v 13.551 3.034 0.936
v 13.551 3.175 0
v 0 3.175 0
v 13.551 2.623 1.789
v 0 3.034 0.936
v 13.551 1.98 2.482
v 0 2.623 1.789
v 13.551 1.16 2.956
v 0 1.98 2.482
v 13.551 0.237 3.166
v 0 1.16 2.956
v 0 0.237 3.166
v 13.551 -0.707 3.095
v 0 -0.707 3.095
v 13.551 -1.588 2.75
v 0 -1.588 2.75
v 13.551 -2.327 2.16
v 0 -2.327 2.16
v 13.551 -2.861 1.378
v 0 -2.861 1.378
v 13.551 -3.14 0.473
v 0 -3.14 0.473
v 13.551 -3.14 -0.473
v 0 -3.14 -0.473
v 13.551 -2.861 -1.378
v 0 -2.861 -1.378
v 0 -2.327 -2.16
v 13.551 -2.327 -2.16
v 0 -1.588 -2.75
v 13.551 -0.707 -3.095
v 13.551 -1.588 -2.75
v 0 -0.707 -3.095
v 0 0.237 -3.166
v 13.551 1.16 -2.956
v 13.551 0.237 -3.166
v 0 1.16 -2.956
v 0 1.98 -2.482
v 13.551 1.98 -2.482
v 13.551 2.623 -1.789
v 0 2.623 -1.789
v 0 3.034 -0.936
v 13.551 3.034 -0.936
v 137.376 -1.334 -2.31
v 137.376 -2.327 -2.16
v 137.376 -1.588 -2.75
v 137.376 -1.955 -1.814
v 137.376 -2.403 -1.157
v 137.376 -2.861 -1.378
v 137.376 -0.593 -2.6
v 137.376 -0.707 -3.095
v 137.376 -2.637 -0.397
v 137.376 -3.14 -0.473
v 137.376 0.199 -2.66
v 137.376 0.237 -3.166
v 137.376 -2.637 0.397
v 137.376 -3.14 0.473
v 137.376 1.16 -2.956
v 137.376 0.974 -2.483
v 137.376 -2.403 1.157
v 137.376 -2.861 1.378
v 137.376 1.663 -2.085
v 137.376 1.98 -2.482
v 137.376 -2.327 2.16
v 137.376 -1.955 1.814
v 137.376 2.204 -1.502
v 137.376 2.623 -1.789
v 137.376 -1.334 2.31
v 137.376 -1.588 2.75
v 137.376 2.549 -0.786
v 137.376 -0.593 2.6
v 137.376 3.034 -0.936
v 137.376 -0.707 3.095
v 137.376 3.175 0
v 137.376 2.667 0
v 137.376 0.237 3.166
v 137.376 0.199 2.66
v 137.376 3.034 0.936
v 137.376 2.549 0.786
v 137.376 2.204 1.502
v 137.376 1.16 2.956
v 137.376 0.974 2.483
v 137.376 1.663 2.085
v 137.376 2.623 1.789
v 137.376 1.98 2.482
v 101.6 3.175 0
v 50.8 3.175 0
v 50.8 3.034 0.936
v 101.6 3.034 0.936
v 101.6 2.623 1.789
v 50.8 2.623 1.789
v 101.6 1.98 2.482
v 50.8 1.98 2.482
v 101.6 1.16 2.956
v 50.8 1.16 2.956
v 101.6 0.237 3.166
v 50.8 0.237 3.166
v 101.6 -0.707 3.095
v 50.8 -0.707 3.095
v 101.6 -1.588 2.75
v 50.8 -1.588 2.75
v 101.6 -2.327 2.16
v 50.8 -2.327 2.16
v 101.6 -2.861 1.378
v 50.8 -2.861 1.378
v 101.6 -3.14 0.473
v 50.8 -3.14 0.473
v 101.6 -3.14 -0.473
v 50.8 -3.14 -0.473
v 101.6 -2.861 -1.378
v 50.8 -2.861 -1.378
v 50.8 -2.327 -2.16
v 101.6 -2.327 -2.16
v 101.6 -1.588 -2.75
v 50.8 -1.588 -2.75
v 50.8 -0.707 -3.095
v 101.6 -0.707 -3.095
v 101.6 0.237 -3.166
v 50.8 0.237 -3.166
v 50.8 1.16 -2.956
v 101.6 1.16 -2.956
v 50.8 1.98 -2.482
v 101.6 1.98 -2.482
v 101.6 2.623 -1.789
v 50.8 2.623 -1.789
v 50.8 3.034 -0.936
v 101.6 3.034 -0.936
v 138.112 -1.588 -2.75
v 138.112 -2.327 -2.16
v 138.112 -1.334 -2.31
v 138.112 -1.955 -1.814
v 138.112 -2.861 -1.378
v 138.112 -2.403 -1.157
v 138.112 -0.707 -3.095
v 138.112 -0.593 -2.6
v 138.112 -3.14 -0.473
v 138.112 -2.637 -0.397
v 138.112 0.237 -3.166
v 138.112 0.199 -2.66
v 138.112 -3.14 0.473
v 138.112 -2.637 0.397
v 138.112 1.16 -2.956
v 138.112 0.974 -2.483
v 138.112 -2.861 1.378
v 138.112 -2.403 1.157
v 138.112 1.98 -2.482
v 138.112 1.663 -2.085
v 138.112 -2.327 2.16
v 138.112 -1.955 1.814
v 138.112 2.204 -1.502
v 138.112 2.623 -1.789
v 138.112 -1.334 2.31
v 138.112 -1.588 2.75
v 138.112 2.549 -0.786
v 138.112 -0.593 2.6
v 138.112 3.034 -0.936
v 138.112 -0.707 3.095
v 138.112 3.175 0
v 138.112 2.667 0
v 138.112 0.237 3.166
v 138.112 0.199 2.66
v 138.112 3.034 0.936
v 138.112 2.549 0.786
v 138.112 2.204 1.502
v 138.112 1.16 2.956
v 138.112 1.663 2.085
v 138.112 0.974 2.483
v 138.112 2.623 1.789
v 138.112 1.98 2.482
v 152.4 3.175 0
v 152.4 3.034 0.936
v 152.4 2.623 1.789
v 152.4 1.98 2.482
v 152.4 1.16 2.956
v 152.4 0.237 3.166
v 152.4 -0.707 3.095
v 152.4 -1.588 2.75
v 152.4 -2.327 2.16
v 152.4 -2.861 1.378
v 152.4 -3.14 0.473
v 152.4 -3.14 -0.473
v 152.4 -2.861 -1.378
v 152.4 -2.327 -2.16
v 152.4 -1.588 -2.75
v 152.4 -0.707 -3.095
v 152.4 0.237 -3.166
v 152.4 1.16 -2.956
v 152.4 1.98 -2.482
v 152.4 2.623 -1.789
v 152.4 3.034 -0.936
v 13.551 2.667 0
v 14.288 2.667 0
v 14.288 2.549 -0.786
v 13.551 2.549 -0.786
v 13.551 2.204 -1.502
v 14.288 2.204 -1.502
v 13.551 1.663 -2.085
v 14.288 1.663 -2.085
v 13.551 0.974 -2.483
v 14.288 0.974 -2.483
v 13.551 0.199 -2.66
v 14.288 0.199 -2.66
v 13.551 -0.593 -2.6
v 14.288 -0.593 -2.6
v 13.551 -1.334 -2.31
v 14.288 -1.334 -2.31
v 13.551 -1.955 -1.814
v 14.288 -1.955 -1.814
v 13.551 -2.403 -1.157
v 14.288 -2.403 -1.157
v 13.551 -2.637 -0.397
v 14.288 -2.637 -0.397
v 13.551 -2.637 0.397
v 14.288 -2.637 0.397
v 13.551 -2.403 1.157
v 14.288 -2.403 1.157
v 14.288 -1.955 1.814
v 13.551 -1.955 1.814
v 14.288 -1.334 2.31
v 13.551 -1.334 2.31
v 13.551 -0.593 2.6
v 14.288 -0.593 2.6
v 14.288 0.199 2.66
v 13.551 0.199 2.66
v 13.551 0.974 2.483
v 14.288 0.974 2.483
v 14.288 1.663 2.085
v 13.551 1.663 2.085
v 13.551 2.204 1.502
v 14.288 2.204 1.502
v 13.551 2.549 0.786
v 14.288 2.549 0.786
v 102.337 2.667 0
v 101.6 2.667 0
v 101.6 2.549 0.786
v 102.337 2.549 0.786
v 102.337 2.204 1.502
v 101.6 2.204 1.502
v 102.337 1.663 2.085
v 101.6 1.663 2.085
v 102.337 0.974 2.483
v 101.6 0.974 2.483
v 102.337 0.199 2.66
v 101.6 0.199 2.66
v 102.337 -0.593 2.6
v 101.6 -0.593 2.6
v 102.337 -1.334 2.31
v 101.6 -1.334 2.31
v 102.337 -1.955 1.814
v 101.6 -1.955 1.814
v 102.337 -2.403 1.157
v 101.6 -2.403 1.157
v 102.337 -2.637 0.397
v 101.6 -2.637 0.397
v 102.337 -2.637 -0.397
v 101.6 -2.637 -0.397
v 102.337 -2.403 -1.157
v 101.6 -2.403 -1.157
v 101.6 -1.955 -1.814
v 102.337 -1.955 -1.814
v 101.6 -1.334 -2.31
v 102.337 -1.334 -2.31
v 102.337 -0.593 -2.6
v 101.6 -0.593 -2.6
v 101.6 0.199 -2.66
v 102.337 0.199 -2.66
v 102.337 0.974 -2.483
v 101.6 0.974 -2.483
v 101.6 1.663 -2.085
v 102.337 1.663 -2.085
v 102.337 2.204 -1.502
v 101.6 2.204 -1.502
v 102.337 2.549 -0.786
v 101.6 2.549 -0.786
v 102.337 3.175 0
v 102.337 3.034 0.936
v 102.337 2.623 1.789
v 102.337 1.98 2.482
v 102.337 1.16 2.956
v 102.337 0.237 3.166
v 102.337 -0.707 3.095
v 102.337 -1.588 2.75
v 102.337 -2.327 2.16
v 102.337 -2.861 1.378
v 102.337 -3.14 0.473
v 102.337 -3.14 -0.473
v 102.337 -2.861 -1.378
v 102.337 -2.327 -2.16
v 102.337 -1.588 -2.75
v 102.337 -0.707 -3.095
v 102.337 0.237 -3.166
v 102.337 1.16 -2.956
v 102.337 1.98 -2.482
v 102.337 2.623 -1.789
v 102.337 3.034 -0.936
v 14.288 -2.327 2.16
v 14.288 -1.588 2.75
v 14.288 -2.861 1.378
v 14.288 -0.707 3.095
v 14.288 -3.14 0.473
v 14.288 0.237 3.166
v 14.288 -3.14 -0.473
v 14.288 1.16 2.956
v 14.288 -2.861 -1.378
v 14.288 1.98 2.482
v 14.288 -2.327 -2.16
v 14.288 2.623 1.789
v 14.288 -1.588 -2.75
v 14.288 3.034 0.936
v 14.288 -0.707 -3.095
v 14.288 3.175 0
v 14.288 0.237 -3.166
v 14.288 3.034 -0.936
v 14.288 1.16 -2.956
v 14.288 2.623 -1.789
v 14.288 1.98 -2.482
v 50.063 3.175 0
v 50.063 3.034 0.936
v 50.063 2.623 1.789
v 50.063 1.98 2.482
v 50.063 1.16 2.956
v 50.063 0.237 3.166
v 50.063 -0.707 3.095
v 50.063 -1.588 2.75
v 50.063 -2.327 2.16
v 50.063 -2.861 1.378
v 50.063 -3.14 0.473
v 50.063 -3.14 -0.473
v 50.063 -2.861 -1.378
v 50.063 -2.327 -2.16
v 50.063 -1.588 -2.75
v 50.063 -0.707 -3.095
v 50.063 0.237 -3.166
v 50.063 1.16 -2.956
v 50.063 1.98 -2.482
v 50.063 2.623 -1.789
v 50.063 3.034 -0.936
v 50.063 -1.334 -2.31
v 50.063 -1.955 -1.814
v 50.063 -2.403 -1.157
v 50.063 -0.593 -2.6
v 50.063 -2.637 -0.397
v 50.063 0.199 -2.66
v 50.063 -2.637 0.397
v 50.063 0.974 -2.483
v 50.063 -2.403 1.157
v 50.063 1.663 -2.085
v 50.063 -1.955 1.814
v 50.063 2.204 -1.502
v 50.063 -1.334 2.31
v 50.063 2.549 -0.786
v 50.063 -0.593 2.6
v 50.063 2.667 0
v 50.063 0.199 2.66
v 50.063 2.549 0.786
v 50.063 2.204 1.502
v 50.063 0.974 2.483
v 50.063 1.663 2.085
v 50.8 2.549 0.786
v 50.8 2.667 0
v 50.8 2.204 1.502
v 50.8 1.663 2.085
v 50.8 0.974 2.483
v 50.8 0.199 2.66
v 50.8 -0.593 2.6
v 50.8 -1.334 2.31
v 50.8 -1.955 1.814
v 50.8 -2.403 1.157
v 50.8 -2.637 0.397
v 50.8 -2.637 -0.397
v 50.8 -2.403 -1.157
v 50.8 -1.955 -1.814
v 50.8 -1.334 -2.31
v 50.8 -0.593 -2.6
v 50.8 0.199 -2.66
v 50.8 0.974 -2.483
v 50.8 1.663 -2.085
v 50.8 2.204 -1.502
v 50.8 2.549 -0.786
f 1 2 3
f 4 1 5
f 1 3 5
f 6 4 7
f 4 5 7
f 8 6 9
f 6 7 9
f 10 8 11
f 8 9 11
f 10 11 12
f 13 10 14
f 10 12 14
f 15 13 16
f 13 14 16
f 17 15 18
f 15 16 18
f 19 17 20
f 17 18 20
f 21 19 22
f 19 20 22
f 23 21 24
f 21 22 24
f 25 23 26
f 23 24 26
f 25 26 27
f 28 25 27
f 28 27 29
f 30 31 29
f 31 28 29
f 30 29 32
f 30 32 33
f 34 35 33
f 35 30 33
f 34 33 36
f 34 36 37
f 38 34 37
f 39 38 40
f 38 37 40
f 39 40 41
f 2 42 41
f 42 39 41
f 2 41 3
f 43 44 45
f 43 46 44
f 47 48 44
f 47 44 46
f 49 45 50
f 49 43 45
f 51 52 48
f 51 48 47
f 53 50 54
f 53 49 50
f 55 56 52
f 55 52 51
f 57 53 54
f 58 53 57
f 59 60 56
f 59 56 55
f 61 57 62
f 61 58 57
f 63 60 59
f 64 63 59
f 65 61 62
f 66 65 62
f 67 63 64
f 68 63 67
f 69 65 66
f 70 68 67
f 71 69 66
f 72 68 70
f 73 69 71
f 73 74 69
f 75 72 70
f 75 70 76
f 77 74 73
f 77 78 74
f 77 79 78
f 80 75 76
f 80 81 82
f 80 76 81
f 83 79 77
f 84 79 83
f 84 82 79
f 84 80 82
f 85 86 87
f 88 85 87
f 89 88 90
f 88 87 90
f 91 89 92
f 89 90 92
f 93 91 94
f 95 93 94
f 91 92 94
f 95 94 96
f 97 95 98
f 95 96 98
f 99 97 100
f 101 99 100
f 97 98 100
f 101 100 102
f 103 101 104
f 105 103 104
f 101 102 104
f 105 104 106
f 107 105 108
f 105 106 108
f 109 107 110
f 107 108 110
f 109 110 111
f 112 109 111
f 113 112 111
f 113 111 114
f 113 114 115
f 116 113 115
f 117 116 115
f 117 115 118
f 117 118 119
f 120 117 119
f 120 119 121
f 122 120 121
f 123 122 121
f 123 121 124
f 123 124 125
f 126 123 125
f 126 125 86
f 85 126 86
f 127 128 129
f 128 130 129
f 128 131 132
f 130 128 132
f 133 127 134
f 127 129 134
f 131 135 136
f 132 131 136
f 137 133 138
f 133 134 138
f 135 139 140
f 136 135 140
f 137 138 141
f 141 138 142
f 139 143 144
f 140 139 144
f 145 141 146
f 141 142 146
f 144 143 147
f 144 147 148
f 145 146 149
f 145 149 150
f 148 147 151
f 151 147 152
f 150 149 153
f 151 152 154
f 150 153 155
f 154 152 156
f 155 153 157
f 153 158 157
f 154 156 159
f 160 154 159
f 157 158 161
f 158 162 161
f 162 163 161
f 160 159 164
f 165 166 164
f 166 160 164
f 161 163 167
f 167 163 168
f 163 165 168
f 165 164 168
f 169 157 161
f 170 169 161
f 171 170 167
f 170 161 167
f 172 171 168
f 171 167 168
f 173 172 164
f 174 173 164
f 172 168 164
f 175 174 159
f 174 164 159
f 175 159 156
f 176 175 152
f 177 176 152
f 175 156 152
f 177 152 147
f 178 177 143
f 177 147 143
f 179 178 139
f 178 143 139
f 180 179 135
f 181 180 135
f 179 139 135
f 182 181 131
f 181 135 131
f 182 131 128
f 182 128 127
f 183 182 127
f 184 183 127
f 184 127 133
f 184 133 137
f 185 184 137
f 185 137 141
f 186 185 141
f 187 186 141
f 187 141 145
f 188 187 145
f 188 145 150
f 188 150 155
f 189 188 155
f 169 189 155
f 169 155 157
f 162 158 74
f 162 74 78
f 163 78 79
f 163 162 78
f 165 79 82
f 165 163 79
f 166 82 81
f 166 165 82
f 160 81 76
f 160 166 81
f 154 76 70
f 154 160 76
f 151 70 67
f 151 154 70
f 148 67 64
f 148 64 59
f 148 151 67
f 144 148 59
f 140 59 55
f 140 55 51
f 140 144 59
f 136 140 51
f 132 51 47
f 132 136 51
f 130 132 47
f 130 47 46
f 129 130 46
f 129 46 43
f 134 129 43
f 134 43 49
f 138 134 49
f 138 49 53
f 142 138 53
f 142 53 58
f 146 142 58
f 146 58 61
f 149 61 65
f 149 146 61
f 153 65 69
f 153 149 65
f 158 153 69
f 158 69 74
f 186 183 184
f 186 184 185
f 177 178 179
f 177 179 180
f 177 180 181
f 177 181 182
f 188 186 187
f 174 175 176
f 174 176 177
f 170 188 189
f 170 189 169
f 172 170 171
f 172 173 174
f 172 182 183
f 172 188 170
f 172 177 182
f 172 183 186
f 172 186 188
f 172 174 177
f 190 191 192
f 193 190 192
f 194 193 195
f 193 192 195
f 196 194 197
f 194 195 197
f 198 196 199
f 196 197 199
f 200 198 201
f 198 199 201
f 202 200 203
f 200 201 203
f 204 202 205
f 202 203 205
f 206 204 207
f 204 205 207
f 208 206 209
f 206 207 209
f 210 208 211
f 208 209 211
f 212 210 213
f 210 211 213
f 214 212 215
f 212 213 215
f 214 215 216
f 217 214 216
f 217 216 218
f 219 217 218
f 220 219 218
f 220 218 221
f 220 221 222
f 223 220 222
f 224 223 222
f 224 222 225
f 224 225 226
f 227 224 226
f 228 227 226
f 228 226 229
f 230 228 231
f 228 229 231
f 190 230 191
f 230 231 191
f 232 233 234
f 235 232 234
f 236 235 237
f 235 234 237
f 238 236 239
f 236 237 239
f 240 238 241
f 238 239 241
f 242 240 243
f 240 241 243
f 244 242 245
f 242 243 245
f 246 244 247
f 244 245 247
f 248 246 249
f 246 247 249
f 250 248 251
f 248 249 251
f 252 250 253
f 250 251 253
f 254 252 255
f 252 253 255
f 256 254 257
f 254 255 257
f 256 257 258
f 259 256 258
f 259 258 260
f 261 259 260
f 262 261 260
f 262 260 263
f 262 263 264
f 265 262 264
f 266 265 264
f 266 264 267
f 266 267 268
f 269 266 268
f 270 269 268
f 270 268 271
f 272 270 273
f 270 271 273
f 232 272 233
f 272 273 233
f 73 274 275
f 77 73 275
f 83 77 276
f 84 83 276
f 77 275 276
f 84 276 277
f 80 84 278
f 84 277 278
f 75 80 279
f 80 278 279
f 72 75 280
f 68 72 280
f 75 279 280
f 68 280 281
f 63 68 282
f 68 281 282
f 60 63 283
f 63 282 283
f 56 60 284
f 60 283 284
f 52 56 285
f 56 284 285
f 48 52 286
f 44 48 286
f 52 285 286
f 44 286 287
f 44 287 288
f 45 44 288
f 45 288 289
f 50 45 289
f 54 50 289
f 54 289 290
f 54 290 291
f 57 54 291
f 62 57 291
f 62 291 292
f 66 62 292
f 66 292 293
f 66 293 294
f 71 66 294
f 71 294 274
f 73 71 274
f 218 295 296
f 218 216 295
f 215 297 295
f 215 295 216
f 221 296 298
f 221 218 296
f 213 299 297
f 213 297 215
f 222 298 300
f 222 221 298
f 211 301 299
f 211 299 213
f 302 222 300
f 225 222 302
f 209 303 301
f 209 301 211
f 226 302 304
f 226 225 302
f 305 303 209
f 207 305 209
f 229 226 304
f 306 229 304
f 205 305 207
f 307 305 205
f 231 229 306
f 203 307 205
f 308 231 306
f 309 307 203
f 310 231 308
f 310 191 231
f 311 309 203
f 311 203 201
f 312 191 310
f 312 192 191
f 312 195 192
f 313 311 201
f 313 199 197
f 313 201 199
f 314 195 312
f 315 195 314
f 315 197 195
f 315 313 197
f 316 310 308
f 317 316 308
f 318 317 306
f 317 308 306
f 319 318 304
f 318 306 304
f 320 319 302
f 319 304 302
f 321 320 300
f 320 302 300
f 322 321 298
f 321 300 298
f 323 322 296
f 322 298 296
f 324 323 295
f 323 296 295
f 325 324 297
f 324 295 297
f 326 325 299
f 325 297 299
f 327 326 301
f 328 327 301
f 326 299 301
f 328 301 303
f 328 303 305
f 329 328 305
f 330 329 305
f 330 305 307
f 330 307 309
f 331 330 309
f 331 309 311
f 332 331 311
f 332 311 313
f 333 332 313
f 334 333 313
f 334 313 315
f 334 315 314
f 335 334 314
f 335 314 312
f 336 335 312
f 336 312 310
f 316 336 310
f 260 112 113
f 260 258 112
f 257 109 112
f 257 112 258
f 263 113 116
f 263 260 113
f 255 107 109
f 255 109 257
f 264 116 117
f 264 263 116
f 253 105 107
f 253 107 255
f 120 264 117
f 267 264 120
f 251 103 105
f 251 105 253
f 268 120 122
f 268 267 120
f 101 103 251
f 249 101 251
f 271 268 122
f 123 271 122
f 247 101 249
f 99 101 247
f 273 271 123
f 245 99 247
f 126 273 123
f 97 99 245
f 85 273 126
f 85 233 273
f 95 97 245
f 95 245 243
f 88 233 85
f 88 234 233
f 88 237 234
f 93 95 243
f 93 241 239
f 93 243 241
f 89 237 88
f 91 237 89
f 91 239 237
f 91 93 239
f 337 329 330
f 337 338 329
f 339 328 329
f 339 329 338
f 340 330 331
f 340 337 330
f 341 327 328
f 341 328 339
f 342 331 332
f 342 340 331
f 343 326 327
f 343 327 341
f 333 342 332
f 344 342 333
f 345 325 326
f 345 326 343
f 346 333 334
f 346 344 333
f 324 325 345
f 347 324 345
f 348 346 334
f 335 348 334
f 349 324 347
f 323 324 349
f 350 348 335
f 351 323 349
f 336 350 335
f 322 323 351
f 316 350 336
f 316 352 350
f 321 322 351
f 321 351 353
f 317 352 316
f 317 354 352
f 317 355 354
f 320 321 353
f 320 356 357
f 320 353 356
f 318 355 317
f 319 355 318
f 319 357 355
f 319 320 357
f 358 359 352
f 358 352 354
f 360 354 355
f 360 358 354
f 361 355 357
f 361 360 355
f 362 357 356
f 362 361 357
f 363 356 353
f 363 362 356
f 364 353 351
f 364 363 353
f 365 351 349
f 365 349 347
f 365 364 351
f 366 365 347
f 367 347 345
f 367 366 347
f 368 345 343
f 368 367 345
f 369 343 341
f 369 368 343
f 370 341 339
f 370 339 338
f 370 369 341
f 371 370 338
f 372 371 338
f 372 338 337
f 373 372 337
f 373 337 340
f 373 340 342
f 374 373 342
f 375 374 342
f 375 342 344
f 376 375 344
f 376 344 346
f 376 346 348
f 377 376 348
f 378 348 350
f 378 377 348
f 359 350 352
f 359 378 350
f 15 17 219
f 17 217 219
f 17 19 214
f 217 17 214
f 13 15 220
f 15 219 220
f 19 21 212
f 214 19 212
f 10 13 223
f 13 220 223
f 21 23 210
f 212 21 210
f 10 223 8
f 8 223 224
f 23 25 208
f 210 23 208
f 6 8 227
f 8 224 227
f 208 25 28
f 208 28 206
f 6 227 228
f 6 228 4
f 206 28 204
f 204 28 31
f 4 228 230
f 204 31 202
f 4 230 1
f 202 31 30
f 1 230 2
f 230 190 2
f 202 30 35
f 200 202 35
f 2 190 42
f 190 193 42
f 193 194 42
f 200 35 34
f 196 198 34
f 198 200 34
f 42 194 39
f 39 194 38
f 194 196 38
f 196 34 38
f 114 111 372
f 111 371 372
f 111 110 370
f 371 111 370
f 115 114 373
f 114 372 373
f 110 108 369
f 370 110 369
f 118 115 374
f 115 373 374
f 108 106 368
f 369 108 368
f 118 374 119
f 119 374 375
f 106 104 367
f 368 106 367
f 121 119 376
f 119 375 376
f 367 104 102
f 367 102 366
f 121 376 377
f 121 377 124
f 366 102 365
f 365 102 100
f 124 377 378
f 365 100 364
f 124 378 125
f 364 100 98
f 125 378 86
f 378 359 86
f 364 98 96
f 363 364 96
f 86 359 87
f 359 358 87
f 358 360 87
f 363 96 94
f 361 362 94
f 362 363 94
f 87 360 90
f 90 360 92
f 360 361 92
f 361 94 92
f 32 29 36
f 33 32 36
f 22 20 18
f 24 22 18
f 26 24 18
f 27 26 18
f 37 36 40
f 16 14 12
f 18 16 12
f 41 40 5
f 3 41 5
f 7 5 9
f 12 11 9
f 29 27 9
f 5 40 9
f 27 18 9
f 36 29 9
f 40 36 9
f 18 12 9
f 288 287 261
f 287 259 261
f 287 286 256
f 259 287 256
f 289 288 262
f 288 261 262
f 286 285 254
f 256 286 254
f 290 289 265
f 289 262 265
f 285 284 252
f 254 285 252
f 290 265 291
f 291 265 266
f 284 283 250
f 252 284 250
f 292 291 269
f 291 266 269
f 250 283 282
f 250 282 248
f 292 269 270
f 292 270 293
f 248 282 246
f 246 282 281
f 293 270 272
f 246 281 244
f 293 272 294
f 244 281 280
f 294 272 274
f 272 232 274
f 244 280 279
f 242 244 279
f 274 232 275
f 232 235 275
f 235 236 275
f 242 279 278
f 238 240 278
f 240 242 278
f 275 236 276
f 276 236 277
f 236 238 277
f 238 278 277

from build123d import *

# Parameters (mm, degrees)
F0_R      = 3.175
F1_DEPTH  = 152.4
F3_R      = 3.175
F3_R_2    = 2.667
F4_DEPTH  = 0.7366
F6_R      = 3.175
F6_R_2    = 2.667
F7_DEPTH  = 0.7366
F9_R      = 3.175
F9_R_2    = 2.667
F10_DEPTH = 0.7366
F12_R     = 3.175
F12_R_2   = 2.667
F13_DEPTH = 0.7366


with BuildPart() as f1:
    # F0 (on Right) → F1 (new body)
    with BuildSketch(Plane.YZ):
        Circle(F0_R)
    extrude(amount=F1_DEPTH)

    # F3 (on offset) → F4 (cut)
    with BuildSketch(Plane.YZ.offset(138.1125)):
        Circle(F3_R)
        Circle(F3_R_2, mode=Mode.SUBTRACT)
    extrude(amount=-F4_DEPTH, mode=Mode.SUBTRACT)

    # F6 (on offset) → F7 (cut)
    with BuildSketch(Plane(origin=(14.2875, 0, 0), x_dir=(0, 1, 0), z_dir=(-1, 0, 0))):
        Circle(F6_R)
        Circle(F6_R_2, mode=Mode.SUBTRACT)
    extrude(amount=F7_DEPTH, mode=Mode.SUBTRACT)

    # F9 (on offset) → F10 (cut)
    with BuildSketch(Plane.YZ.offset(50.8)):
        Circle(F9_R)
        Circle(F9_R_2, mode=Mode.SUBTRACT)
    extrude(amount=-F10_DEPTH, mode=Mode.SUBTRACT)

    # F12 (on offset) → F13 (cut)
    with BuildSketch(Plane.YZ.offset(101.6)):
        Circle(F12_R)
        Circle(F12_R_2, mode=Mode.SUBTRACT)
    extrude(amount=F13_DEPTH, mode=Mode.SUBTRACT)


solid = f1.part
